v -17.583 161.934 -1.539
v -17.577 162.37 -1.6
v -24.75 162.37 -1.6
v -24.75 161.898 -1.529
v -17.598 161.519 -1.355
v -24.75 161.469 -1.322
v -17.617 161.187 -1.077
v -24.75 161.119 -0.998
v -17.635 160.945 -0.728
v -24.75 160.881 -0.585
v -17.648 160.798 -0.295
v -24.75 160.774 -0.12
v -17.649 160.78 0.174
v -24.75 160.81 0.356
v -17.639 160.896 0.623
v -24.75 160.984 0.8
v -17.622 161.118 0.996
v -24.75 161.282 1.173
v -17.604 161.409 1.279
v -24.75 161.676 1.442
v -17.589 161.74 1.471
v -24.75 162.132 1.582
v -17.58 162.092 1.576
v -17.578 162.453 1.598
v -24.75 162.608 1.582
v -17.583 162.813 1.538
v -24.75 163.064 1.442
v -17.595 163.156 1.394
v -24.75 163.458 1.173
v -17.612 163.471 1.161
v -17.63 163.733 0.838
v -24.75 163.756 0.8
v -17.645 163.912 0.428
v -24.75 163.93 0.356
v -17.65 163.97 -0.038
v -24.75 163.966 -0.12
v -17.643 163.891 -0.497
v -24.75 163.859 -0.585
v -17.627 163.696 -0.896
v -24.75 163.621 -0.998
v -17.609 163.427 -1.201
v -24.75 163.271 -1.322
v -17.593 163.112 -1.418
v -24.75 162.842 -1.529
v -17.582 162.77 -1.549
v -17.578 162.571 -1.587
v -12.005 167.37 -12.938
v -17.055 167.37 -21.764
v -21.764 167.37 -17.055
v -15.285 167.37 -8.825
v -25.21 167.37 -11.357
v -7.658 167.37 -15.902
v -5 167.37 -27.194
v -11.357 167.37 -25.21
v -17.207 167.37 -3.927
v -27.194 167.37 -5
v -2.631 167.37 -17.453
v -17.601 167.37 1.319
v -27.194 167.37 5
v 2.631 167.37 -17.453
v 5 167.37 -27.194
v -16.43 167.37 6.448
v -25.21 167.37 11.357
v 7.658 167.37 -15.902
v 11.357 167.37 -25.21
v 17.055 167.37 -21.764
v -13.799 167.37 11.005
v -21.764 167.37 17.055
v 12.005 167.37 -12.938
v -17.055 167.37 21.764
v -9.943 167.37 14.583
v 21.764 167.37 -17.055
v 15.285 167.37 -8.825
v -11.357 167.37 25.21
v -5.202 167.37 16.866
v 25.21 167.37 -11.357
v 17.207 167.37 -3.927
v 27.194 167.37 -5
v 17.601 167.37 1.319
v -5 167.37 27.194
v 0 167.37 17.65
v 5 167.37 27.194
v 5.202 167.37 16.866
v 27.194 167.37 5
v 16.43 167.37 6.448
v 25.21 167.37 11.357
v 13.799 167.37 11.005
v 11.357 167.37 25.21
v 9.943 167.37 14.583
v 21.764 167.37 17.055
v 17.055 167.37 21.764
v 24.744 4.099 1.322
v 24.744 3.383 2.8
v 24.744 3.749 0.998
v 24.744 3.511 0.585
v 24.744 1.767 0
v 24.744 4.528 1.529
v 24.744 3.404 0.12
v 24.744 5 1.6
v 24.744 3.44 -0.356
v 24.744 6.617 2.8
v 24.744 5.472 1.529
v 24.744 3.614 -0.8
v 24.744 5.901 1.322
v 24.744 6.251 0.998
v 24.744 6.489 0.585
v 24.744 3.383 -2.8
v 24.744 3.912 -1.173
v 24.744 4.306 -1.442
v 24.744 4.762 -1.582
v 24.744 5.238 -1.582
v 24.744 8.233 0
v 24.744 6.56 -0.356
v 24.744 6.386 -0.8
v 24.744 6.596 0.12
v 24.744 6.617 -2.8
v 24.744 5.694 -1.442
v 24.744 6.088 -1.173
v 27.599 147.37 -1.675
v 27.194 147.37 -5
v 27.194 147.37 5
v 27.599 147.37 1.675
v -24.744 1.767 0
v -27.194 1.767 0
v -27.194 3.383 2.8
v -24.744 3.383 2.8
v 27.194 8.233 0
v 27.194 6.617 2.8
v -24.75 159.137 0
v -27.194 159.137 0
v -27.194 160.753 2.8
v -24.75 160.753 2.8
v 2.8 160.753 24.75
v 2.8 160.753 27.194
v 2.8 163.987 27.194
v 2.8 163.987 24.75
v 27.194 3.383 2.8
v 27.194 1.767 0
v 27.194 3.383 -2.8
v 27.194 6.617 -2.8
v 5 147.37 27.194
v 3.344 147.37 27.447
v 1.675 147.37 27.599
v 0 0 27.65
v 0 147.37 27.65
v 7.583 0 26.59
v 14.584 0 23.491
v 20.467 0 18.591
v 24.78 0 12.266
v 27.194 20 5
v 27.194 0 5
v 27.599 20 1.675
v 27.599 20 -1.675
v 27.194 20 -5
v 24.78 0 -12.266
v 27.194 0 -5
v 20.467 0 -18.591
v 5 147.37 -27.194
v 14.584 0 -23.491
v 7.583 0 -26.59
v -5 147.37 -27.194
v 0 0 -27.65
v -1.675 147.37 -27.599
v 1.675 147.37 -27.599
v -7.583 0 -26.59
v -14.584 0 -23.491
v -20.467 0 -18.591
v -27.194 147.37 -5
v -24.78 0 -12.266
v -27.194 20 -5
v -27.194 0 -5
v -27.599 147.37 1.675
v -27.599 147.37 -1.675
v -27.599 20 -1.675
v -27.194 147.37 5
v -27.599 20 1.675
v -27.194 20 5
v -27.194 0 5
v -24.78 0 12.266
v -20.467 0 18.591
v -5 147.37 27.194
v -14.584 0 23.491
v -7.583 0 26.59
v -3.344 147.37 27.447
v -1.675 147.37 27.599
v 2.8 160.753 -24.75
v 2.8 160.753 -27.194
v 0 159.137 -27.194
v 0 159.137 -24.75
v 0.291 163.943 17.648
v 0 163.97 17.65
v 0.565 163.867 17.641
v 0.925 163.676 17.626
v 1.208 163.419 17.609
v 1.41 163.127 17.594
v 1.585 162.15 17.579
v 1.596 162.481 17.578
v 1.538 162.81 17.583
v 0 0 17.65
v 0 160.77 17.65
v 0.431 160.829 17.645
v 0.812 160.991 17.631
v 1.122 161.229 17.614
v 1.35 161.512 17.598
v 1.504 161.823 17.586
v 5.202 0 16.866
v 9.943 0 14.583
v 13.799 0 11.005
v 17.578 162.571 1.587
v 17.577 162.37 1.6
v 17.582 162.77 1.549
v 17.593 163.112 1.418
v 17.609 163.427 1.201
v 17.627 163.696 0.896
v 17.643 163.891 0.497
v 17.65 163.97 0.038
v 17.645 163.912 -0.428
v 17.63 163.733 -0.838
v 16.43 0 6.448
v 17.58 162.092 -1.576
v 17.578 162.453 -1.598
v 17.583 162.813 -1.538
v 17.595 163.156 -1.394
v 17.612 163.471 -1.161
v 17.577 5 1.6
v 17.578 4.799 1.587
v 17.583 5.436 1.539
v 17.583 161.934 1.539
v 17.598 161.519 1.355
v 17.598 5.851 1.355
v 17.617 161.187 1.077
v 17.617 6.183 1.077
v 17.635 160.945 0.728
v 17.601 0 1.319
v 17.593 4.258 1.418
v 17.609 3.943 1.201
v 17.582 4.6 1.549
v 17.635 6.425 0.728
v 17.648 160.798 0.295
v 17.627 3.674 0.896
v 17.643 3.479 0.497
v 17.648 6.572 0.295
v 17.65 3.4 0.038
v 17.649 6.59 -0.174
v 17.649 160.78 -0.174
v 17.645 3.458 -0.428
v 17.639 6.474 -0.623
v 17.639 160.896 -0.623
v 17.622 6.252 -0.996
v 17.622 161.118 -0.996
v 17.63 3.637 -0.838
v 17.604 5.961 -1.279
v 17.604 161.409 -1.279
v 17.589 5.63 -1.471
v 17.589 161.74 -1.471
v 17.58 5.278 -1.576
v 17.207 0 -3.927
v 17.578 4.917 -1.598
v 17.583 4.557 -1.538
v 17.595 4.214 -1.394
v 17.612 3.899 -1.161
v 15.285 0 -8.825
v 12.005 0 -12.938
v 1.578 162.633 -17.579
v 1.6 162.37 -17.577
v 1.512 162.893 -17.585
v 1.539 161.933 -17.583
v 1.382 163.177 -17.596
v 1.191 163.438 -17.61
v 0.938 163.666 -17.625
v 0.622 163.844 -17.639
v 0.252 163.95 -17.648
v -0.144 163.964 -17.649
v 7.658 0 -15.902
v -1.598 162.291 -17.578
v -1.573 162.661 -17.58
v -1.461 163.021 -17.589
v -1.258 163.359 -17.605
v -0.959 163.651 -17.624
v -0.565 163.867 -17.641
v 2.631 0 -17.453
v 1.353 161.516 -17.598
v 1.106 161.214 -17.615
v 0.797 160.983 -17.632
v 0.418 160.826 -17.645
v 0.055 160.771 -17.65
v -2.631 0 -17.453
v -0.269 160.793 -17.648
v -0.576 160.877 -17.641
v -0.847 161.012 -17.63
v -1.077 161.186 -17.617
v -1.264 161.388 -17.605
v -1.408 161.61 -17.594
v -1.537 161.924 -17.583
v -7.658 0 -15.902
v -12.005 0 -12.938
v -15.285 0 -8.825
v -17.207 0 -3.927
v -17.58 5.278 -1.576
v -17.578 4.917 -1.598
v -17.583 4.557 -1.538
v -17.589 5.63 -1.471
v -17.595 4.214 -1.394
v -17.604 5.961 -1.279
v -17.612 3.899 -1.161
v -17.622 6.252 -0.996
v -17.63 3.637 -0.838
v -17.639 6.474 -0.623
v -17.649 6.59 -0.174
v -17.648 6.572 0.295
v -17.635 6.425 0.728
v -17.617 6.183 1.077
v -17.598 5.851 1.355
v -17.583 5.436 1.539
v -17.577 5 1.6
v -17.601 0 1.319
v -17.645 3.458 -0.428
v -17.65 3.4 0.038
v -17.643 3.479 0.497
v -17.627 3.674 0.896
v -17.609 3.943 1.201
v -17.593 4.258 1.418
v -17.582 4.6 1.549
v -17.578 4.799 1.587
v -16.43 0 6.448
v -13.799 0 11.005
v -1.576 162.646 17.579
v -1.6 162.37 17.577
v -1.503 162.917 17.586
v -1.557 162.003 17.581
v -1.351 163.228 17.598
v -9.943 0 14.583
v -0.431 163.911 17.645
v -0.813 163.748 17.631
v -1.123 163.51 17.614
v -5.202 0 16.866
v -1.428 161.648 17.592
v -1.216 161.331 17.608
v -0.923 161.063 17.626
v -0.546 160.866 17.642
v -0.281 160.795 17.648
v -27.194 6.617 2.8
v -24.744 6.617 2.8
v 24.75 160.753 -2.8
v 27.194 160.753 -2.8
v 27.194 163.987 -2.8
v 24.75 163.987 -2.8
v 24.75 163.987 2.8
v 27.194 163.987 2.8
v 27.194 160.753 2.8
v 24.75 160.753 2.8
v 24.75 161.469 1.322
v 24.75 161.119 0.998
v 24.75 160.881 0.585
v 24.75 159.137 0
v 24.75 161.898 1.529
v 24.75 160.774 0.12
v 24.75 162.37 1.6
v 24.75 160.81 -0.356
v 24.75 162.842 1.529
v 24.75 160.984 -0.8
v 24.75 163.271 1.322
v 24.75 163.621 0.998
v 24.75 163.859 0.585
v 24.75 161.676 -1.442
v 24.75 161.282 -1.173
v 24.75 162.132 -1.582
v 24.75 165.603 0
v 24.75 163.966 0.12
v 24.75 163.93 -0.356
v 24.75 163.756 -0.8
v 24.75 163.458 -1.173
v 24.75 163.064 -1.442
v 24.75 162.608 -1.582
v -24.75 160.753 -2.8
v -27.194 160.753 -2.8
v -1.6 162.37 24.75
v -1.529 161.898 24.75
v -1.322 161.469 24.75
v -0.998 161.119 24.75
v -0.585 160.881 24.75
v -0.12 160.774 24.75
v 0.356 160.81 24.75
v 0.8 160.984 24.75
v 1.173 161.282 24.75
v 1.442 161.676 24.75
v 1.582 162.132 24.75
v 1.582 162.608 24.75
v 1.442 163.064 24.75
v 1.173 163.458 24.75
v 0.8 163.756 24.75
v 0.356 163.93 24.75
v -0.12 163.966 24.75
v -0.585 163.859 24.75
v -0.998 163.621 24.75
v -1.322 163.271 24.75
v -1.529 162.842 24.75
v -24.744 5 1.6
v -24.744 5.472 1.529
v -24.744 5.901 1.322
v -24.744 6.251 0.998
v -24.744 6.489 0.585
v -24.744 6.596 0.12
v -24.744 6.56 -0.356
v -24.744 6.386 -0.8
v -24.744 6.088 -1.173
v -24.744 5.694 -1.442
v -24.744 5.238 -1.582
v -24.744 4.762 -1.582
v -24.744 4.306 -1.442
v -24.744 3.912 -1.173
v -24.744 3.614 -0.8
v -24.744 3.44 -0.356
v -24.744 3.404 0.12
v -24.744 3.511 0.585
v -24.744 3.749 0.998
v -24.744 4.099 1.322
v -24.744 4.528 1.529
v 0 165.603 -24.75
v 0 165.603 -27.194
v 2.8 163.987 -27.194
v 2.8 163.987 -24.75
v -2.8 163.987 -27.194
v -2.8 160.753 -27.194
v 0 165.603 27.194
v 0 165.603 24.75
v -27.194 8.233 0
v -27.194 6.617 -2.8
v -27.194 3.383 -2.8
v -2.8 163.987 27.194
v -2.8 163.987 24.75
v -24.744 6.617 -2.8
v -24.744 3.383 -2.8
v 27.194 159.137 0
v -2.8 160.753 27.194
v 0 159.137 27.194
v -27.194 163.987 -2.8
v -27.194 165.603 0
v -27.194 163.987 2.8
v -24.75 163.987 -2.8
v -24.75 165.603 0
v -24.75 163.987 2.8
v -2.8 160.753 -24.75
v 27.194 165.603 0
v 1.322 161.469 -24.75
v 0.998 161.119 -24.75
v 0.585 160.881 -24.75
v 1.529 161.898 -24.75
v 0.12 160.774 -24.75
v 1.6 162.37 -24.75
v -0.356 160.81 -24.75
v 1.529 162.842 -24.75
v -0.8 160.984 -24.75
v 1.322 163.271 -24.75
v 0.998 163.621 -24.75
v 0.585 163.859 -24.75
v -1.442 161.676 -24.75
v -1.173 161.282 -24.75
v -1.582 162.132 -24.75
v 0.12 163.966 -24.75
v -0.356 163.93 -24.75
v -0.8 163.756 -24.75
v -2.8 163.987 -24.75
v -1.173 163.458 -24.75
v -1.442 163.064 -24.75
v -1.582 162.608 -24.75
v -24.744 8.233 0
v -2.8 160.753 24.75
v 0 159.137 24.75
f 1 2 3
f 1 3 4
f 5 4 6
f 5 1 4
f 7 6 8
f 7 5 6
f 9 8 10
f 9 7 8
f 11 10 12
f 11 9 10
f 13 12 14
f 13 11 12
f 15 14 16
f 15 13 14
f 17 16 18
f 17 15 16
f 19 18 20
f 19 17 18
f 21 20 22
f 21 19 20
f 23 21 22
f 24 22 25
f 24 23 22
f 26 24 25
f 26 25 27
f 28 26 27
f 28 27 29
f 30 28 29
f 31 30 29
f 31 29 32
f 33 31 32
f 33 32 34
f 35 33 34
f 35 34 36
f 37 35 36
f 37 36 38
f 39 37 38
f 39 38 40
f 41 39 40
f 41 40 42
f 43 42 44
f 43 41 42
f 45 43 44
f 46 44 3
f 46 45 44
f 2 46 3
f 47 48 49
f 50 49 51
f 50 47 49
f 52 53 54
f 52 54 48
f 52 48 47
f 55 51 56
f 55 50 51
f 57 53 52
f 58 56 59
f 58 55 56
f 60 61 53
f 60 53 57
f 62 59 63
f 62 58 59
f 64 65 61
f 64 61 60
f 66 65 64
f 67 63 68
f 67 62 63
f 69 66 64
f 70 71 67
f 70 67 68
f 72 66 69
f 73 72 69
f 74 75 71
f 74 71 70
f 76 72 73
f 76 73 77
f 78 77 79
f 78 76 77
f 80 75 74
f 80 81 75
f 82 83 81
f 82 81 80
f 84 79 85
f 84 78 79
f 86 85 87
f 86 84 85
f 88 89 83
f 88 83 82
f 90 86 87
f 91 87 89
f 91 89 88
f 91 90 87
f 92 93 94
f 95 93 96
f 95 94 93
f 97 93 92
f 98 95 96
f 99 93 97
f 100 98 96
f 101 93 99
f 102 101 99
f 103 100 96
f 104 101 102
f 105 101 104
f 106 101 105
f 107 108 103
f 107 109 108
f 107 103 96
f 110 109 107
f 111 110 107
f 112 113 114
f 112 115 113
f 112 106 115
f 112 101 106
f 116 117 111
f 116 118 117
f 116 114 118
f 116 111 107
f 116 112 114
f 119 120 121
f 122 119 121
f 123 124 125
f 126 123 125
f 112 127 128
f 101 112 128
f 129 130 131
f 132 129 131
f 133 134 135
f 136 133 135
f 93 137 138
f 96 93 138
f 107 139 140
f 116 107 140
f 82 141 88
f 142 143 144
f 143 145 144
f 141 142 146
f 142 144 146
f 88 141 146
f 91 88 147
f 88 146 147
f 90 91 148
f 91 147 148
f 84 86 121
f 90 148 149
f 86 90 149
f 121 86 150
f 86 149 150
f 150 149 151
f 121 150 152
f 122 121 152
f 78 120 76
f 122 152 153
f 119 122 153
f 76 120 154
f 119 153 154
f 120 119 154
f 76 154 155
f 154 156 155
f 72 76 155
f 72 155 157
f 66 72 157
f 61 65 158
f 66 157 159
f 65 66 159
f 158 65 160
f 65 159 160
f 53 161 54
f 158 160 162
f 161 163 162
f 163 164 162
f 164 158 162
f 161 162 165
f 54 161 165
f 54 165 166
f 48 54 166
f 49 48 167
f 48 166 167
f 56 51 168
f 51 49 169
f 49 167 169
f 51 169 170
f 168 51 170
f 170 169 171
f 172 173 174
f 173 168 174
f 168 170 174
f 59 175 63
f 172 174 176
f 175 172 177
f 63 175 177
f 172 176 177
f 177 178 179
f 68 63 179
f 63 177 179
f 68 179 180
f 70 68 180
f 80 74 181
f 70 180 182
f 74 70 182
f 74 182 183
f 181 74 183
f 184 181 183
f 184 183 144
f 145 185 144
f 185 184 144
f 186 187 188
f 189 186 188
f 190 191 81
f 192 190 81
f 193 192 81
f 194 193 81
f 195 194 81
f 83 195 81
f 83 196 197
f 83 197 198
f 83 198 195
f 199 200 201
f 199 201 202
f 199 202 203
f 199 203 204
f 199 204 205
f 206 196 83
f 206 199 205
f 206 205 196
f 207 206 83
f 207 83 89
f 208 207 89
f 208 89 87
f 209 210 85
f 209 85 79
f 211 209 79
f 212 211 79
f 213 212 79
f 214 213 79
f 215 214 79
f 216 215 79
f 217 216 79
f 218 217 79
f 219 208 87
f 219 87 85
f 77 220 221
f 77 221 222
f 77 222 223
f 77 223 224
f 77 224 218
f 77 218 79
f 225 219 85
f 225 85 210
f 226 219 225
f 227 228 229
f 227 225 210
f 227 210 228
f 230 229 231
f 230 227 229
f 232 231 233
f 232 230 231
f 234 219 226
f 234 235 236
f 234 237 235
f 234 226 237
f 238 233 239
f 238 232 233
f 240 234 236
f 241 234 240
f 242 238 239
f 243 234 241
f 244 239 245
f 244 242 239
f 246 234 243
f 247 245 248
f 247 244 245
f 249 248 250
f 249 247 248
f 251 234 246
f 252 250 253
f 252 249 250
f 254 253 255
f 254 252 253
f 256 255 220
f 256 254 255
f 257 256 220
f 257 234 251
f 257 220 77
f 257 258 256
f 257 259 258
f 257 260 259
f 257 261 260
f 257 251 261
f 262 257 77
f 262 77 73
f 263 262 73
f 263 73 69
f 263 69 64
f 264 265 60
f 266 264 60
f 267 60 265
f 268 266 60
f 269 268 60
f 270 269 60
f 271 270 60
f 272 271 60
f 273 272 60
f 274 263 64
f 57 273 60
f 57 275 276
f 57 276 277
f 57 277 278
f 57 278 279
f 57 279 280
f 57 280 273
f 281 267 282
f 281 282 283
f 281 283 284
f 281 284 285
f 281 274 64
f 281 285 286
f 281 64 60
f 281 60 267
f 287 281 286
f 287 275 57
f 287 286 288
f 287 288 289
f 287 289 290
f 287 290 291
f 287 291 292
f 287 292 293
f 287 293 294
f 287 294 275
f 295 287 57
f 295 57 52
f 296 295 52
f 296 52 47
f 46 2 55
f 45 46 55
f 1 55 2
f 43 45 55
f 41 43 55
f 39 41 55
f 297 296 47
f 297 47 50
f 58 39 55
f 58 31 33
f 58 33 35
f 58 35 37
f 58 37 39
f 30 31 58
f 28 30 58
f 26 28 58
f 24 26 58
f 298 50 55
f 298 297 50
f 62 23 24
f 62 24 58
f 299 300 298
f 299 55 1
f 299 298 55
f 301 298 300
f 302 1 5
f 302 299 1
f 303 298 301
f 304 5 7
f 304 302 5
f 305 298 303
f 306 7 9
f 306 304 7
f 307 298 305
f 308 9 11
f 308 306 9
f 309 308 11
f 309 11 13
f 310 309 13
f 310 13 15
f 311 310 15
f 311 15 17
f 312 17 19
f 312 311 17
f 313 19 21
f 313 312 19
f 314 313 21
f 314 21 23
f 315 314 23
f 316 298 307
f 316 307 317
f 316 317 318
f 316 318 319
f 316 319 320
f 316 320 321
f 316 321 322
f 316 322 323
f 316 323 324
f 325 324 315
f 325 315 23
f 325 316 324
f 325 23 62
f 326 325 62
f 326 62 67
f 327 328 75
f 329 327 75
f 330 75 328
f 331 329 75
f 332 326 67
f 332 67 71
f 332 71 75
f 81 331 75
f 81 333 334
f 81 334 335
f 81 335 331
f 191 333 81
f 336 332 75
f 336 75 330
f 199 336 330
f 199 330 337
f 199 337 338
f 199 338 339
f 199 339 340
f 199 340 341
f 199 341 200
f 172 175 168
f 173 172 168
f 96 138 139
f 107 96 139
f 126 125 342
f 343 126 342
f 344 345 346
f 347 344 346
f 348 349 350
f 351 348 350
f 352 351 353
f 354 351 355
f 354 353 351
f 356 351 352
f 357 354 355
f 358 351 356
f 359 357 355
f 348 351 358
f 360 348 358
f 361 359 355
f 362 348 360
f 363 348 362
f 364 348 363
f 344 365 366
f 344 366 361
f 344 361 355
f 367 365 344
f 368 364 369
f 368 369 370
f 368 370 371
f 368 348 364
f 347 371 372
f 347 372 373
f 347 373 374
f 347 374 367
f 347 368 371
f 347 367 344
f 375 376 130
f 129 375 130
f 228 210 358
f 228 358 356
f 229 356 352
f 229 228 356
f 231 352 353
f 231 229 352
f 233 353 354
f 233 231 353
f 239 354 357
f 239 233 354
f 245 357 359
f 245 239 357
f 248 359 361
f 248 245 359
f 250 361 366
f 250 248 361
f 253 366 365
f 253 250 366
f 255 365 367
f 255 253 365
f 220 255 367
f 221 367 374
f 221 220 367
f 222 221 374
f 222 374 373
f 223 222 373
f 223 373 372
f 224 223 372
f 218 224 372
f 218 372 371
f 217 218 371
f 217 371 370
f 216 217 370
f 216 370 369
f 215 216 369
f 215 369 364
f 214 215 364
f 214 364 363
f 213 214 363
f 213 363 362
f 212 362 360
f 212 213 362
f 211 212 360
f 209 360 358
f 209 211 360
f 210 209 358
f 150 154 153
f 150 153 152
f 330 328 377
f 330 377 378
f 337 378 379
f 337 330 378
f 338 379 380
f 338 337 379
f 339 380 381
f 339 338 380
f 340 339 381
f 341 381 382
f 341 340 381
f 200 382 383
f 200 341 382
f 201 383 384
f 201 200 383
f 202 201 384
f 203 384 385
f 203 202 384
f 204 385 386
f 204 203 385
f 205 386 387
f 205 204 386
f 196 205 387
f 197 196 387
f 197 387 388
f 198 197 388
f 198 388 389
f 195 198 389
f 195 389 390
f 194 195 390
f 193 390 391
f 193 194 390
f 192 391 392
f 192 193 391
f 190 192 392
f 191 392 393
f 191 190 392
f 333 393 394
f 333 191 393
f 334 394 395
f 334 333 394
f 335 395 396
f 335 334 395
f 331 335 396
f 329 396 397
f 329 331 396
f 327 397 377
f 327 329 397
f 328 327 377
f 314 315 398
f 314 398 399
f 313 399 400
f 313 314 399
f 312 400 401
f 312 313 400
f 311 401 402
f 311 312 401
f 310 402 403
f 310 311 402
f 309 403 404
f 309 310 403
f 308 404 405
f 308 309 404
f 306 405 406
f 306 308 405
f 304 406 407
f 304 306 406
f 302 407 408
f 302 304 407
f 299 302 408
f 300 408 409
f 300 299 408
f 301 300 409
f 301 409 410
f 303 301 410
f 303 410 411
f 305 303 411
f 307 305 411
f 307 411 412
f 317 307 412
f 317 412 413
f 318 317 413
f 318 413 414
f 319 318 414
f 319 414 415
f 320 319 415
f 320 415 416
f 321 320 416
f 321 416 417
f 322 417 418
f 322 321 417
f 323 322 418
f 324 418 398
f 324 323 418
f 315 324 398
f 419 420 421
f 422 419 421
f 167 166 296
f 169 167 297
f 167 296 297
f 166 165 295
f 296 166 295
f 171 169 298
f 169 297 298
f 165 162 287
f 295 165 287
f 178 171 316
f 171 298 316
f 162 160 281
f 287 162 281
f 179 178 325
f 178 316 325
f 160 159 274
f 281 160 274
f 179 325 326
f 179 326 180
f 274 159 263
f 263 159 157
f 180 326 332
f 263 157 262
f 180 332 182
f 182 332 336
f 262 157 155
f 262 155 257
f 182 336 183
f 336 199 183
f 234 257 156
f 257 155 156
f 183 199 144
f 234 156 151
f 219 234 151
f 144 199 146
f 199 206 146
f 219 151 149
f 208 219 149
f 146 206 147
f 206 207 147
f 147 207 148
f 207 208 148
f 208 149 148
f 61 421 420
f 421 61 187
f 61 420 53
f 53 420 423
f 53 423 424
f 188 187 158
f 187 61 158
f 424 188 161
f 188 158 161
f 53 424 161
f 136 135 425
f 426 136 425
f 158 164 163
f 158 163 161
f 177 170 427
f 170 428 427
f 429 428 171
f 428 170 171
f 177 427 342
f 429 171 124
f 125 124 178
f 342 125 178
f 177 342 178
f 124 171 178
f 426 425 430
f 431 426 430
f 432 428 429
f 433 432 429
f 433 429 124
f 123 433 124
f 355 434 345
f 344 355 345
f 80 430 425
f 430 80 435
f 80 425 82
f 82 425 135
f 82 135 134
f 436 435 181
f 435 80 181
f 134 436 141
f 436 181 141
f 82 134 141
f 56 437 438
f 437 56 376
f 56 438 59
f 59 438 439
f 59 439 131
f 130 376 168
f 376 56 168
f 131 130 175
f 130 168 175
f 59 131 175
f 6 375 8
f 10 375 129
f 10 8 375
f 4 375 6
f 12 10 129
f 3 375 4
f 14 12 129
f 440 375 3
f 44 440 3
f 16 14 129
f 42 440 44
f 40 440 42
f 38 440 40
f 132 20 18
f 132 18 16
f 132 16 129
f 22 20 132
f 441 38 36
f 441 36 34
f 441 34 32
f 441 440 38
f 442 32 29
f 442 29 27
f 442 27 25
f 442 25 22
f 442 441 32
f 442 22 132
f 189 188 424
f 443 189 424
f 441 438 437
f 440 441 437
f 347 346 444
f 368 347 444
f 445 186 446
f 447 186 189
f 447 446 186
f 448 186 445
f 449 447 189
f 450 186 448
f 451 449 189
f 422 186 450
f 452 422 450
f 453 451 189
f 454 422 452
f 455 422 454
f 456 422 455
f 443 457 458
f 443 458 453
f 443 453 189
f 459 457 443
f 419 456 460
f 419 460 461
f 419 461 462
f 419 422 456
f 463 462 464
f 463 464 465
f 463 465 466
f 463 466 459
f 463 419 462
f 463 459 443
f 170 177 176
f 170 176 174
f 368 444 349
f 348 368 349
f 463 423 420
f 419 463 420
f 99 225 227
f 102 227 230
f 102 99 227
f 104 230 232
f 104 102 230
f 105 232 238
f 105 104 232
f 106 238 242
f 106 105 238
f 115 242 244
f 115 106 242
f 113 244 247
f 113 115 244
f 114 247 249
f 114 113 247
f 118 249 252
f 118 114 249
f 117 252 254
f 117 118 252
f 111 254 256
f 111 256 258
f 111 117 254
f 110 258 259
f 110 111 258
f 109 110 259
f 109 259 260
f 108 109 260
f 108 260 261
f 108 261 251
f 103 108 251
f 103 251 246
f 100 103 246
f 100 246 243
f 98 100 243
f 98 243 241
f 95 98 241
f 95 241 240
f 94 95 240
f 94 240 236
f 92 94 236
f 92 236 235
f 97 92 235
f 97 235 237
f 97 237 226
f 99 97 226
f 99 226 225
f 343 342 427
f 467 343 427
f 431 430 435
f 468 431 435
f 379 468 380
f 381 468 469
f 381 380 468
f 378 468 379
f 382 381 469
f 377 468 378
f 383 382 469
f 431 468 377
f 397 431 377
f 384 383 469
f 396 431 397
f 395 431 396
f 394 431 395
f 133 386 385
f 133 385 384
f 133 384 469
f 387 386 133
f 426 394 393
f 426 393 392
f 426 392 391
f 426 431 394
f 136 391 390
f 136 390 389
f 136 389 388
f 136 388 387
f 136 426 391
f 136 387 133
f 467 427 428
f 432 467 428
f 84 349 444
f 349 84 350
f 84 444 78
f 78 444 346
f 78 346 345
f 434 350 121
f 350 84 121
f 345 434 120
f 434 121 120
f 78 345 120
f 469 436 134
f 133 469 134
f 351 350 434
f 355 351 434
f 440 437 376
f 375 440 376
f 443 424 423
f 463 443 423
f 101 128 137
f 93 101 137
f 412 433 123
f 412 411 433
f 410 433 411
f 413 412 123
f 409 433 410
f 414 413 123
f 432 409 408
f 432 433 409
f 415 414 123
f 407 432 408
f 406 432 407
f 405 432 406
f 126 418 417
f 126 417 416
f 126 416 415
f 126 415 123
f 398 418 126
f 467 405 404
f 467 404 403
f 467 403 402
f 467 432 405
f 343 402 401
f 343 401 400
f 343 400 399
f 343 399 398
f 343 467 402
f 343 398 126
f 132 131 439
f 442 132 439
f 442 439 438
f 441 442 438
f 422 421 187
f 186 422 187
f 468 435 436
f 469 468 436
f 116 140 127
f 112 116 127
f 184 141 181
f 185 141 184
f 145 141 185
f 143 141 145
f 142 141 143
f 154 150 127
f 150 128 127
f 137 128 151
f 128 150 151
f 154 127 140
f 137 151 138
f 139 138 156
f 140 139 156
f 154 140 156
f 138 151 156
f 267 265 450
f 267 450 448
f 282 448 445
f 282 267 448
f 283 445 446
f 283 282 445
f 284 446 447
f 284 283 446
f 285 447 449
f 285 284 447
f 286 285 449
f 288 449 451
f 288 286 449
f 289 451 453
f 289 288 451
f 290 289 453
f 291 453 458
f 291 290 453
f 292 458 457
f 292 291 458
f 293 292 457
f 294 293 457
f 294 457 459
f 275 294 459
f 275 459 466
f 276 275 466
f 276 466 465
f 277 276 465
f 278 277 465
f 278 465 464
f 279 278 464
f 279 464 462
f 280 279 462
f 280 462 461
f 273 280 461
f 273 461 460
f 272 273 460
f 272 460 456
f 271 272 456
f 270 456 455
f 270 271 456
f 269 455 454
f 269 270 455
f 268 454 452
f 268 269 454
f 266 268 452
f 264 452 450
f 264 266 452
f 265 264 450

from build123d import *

# Parameters (mm, degrees)
SKETCH_1_R               = 27.65
SKETCH_1_R_2             = 17.65
EXTRUDE_1_DEPTH          = 167.37
CUT_EXTRUDE_1_DEPTH      = 20
CUT_EXTRUDE_START        = 147.37
CUT_EXTRUDE_2_DEPTH      = 20
CUT_EXTRUDE_4_DEPTH      = 26
CUT_EXTRUDE_4_DEPTH_BACK = 26
SKETCH_5_R               = 1.6
CUT_EXTRUDE_START_2      = 27.194163
CUT_EXTRUDE_3_DEPTH      = 2.45
CUT_EXTRUDE_5_DEPTH      = 2.45
CUT_EXTRUDE_START_3      = 27.2
CUT_EXTRUDE_6_DEPTH      = 2.45
PATTERN_CIRCULAR_2_COUNT = 4
SKETCH_8_R               = 1.6
CUT_EXTRUDE_7_DEPTH      = 32.4
PATTERN_CIRCULAR_3_COUNT = 4


with BuildPart() as part:
    # 草图1 → 凸台-拉伸1 (new body)
    with BuildSketch(Plane(origin=(0, 0, 0), x_dir=(1, 0, 0), z_dir=(0, 1, 0))):
        with Locations(Location((0, 0, 0), (0, 0, 270))):
            Circle(SKETCH_1_R)
        with Locations(Location((0, 0, 0), (0, 0, 270))):
            Circle(SKETCH_1_R_2, mode=Mode.SUBTRACT)
    extrude(amount=EXTRUDE_1_DEPTH)

    # 草图2 → 切除-拉伸1 (cut)
    with BuildSketch(Plane(origin=(0, 0, 0), x_dir=(1, 0, 0), z_dir=(0, 1, 0))):
        with BuildLine():
            Line((-27.194162977, 5), (-27.194162977, -5))
            ThreePointArc((-27.194162977, -5), (-27.65, 0), (-27.194162977, 5))
        make_face()
        with BuildLine():
            Line((27.194162977, -5), (27.194162977, 5))
            ThreePointArc((27.194162977, 5), (27.65, 0), (27.194162977, -5))
        make_face()
    extrude(amount=CUT_EXTRUDE_1_DEPTH, mode=Mode.SUBTRACT)

    # 草图3 → 切除-拉伸2 (cut)
    with BuildSketch(Plane(origin=(0, 0, 0), x_dir=(1, 0, 0), z_dir=(0, 1, 0)).offset(CUT_EXTRUDE_START)):
        with BuildLine():
            Line((-27.194162977, 5), (-27.194162977, -5))
            ThreePointArc((-27.194162977, -5), (-27.65, 0), (-27.194162977, 5))
        make_face()
        with BuildLine():
            Line((-5, -27.194162977), (5, -27.194162977))
            ThreePointArc((5, -27.194162977), (0, -27.65), (-5, -27.194162977))
        make_face()
        with BuildLine():
            Line((27.194162977, -5), (27.194162977, 5))
            ThreePointArc((27.194162977, 5), (27.65, 0), (27.194162977, -5))
        make_face()
        with BuildLine():
            Line((5, 27.194162977), (-5, 27.194162977))
            ThreePointArc((-5, 27.194162977), (0, 27.65), (5, 27.194162977))
        make_face()
    extrude(amount=CUT_EXTRUDE_2_DEPTH, mode=Mode.SUBTRACT)

    # 草图5 → 切除-拉伸4 (cut, two sides: drawn at the far end of the back side and taken through both)
    with BuildSketch(Plane.ZY.offset(-CUT_EXTRUDE_4_DEPTH_BACK)):
        with Locations((0, 5)):
            Circle(SKETCH_5_R)
    extrude(amount=CUT_EXTRUDE_4_DEPTH + CUT_EXTRUDE_4_DEPTH_BACK, mode=Mode.SUBTRACT)

    # 草图4 → 切除-拉伸3 (cut)
    with BuildSketch(Plane.ZY.offset(CUT_EXTRUDE_START_2)):
        Polygon((0, 8.233161507), (-2.8, 6.616580754), (-2.8, 3.383419246), (0, 1.766838493), (2.8, 3.383419246), (2.8, 6.616580754), align=None)
    extrude(amount=-CUT_EXTRUDE_3_DEPTH, mode=Mode.SUBTRACT)

    # 草图6 → 切除-拉伸5 (cut)
    with BuildSketch(Plane(origin=(0, 0, 0), x_dir=(0, 0, -1), z_dir=(1, 0, 0)).offset(CUT_EXTRUDE_START_2)):
        Polygon((0, 8.233161507), (-2.8, 6.616580754), (-2.8, 3.383419246), (0, 1.766838493), (2.8, 3.383419246), (2.8, 6.616580754), align=None)
    extrude(amount=-CUT_EXTRUDE_5_DEPTH, mode=Mode.SUBTRACT)

    # 草图7 → 切除-拉伸6 (cut)
    with BuildSketch(Plane(origin=(0, 0, 0), x_dir=(0, 0, -1), z_dir=(1, 0, 0)).offset(CUT_EXTRUDE_START_3)):
        Polygon((0, 165.603161507), (-2.8, 163.986580754), (-2.8, 160.753419246), (0, 159.136838493), (2.8, 160.753419246), (2.8, 163.986580754), align=None)
    cut_extrude_6 = extrude(amount=-CUT_EXTRUDE_6_DEPTH, mode=Mode.SUBTRACT)

    # 阵列(圆周)2: 切除-拉伸6 ×4 about axis
    pattern_circular_2_axis = Axis((0, 0, 0), (0, 1, 0))
    for i in range(1, PATTERN_CIRCULAR_2_COUNT):
        add(cut_extrude_6.rotate(pattern_circular_2_axis, i * 360 / PATTERN_CIRCULAR_2_COUNT), mode=Mode.SUBTRACT)

    # 草图8 → 切除-拉伸7 (cut)
    with BuildSketch(Plane(origin=(0, 0, 0), x_dir=(0, 0, -1), z_dir=(1, 0, 0))):
        with Locations(Location((0, 162.37, 0), (0, 0, 180))):
            Circle(SKETCH_8_R)
    cut_extrude_7 = extrude(amount=CUT_EXTRUDE_7_DEPTH, mode=Mode.SUBTRACT)

    # 阵列(圆周)3: 切除-拉伸7 ×4 about axis
    pattern_circular_3_axis = Axis((0, 167.37, 0), (0, -1, 0))
    for i in range(1, PATTERN_CIRCULAR_3_COUNT):
        add(cut_extrude_7.rotate(pattern_circular_3_axis, i * 360 / PATTERN_CIRCULAR_3_COUNT), mode=Mode.SUBTRACT)


solid = part.part
